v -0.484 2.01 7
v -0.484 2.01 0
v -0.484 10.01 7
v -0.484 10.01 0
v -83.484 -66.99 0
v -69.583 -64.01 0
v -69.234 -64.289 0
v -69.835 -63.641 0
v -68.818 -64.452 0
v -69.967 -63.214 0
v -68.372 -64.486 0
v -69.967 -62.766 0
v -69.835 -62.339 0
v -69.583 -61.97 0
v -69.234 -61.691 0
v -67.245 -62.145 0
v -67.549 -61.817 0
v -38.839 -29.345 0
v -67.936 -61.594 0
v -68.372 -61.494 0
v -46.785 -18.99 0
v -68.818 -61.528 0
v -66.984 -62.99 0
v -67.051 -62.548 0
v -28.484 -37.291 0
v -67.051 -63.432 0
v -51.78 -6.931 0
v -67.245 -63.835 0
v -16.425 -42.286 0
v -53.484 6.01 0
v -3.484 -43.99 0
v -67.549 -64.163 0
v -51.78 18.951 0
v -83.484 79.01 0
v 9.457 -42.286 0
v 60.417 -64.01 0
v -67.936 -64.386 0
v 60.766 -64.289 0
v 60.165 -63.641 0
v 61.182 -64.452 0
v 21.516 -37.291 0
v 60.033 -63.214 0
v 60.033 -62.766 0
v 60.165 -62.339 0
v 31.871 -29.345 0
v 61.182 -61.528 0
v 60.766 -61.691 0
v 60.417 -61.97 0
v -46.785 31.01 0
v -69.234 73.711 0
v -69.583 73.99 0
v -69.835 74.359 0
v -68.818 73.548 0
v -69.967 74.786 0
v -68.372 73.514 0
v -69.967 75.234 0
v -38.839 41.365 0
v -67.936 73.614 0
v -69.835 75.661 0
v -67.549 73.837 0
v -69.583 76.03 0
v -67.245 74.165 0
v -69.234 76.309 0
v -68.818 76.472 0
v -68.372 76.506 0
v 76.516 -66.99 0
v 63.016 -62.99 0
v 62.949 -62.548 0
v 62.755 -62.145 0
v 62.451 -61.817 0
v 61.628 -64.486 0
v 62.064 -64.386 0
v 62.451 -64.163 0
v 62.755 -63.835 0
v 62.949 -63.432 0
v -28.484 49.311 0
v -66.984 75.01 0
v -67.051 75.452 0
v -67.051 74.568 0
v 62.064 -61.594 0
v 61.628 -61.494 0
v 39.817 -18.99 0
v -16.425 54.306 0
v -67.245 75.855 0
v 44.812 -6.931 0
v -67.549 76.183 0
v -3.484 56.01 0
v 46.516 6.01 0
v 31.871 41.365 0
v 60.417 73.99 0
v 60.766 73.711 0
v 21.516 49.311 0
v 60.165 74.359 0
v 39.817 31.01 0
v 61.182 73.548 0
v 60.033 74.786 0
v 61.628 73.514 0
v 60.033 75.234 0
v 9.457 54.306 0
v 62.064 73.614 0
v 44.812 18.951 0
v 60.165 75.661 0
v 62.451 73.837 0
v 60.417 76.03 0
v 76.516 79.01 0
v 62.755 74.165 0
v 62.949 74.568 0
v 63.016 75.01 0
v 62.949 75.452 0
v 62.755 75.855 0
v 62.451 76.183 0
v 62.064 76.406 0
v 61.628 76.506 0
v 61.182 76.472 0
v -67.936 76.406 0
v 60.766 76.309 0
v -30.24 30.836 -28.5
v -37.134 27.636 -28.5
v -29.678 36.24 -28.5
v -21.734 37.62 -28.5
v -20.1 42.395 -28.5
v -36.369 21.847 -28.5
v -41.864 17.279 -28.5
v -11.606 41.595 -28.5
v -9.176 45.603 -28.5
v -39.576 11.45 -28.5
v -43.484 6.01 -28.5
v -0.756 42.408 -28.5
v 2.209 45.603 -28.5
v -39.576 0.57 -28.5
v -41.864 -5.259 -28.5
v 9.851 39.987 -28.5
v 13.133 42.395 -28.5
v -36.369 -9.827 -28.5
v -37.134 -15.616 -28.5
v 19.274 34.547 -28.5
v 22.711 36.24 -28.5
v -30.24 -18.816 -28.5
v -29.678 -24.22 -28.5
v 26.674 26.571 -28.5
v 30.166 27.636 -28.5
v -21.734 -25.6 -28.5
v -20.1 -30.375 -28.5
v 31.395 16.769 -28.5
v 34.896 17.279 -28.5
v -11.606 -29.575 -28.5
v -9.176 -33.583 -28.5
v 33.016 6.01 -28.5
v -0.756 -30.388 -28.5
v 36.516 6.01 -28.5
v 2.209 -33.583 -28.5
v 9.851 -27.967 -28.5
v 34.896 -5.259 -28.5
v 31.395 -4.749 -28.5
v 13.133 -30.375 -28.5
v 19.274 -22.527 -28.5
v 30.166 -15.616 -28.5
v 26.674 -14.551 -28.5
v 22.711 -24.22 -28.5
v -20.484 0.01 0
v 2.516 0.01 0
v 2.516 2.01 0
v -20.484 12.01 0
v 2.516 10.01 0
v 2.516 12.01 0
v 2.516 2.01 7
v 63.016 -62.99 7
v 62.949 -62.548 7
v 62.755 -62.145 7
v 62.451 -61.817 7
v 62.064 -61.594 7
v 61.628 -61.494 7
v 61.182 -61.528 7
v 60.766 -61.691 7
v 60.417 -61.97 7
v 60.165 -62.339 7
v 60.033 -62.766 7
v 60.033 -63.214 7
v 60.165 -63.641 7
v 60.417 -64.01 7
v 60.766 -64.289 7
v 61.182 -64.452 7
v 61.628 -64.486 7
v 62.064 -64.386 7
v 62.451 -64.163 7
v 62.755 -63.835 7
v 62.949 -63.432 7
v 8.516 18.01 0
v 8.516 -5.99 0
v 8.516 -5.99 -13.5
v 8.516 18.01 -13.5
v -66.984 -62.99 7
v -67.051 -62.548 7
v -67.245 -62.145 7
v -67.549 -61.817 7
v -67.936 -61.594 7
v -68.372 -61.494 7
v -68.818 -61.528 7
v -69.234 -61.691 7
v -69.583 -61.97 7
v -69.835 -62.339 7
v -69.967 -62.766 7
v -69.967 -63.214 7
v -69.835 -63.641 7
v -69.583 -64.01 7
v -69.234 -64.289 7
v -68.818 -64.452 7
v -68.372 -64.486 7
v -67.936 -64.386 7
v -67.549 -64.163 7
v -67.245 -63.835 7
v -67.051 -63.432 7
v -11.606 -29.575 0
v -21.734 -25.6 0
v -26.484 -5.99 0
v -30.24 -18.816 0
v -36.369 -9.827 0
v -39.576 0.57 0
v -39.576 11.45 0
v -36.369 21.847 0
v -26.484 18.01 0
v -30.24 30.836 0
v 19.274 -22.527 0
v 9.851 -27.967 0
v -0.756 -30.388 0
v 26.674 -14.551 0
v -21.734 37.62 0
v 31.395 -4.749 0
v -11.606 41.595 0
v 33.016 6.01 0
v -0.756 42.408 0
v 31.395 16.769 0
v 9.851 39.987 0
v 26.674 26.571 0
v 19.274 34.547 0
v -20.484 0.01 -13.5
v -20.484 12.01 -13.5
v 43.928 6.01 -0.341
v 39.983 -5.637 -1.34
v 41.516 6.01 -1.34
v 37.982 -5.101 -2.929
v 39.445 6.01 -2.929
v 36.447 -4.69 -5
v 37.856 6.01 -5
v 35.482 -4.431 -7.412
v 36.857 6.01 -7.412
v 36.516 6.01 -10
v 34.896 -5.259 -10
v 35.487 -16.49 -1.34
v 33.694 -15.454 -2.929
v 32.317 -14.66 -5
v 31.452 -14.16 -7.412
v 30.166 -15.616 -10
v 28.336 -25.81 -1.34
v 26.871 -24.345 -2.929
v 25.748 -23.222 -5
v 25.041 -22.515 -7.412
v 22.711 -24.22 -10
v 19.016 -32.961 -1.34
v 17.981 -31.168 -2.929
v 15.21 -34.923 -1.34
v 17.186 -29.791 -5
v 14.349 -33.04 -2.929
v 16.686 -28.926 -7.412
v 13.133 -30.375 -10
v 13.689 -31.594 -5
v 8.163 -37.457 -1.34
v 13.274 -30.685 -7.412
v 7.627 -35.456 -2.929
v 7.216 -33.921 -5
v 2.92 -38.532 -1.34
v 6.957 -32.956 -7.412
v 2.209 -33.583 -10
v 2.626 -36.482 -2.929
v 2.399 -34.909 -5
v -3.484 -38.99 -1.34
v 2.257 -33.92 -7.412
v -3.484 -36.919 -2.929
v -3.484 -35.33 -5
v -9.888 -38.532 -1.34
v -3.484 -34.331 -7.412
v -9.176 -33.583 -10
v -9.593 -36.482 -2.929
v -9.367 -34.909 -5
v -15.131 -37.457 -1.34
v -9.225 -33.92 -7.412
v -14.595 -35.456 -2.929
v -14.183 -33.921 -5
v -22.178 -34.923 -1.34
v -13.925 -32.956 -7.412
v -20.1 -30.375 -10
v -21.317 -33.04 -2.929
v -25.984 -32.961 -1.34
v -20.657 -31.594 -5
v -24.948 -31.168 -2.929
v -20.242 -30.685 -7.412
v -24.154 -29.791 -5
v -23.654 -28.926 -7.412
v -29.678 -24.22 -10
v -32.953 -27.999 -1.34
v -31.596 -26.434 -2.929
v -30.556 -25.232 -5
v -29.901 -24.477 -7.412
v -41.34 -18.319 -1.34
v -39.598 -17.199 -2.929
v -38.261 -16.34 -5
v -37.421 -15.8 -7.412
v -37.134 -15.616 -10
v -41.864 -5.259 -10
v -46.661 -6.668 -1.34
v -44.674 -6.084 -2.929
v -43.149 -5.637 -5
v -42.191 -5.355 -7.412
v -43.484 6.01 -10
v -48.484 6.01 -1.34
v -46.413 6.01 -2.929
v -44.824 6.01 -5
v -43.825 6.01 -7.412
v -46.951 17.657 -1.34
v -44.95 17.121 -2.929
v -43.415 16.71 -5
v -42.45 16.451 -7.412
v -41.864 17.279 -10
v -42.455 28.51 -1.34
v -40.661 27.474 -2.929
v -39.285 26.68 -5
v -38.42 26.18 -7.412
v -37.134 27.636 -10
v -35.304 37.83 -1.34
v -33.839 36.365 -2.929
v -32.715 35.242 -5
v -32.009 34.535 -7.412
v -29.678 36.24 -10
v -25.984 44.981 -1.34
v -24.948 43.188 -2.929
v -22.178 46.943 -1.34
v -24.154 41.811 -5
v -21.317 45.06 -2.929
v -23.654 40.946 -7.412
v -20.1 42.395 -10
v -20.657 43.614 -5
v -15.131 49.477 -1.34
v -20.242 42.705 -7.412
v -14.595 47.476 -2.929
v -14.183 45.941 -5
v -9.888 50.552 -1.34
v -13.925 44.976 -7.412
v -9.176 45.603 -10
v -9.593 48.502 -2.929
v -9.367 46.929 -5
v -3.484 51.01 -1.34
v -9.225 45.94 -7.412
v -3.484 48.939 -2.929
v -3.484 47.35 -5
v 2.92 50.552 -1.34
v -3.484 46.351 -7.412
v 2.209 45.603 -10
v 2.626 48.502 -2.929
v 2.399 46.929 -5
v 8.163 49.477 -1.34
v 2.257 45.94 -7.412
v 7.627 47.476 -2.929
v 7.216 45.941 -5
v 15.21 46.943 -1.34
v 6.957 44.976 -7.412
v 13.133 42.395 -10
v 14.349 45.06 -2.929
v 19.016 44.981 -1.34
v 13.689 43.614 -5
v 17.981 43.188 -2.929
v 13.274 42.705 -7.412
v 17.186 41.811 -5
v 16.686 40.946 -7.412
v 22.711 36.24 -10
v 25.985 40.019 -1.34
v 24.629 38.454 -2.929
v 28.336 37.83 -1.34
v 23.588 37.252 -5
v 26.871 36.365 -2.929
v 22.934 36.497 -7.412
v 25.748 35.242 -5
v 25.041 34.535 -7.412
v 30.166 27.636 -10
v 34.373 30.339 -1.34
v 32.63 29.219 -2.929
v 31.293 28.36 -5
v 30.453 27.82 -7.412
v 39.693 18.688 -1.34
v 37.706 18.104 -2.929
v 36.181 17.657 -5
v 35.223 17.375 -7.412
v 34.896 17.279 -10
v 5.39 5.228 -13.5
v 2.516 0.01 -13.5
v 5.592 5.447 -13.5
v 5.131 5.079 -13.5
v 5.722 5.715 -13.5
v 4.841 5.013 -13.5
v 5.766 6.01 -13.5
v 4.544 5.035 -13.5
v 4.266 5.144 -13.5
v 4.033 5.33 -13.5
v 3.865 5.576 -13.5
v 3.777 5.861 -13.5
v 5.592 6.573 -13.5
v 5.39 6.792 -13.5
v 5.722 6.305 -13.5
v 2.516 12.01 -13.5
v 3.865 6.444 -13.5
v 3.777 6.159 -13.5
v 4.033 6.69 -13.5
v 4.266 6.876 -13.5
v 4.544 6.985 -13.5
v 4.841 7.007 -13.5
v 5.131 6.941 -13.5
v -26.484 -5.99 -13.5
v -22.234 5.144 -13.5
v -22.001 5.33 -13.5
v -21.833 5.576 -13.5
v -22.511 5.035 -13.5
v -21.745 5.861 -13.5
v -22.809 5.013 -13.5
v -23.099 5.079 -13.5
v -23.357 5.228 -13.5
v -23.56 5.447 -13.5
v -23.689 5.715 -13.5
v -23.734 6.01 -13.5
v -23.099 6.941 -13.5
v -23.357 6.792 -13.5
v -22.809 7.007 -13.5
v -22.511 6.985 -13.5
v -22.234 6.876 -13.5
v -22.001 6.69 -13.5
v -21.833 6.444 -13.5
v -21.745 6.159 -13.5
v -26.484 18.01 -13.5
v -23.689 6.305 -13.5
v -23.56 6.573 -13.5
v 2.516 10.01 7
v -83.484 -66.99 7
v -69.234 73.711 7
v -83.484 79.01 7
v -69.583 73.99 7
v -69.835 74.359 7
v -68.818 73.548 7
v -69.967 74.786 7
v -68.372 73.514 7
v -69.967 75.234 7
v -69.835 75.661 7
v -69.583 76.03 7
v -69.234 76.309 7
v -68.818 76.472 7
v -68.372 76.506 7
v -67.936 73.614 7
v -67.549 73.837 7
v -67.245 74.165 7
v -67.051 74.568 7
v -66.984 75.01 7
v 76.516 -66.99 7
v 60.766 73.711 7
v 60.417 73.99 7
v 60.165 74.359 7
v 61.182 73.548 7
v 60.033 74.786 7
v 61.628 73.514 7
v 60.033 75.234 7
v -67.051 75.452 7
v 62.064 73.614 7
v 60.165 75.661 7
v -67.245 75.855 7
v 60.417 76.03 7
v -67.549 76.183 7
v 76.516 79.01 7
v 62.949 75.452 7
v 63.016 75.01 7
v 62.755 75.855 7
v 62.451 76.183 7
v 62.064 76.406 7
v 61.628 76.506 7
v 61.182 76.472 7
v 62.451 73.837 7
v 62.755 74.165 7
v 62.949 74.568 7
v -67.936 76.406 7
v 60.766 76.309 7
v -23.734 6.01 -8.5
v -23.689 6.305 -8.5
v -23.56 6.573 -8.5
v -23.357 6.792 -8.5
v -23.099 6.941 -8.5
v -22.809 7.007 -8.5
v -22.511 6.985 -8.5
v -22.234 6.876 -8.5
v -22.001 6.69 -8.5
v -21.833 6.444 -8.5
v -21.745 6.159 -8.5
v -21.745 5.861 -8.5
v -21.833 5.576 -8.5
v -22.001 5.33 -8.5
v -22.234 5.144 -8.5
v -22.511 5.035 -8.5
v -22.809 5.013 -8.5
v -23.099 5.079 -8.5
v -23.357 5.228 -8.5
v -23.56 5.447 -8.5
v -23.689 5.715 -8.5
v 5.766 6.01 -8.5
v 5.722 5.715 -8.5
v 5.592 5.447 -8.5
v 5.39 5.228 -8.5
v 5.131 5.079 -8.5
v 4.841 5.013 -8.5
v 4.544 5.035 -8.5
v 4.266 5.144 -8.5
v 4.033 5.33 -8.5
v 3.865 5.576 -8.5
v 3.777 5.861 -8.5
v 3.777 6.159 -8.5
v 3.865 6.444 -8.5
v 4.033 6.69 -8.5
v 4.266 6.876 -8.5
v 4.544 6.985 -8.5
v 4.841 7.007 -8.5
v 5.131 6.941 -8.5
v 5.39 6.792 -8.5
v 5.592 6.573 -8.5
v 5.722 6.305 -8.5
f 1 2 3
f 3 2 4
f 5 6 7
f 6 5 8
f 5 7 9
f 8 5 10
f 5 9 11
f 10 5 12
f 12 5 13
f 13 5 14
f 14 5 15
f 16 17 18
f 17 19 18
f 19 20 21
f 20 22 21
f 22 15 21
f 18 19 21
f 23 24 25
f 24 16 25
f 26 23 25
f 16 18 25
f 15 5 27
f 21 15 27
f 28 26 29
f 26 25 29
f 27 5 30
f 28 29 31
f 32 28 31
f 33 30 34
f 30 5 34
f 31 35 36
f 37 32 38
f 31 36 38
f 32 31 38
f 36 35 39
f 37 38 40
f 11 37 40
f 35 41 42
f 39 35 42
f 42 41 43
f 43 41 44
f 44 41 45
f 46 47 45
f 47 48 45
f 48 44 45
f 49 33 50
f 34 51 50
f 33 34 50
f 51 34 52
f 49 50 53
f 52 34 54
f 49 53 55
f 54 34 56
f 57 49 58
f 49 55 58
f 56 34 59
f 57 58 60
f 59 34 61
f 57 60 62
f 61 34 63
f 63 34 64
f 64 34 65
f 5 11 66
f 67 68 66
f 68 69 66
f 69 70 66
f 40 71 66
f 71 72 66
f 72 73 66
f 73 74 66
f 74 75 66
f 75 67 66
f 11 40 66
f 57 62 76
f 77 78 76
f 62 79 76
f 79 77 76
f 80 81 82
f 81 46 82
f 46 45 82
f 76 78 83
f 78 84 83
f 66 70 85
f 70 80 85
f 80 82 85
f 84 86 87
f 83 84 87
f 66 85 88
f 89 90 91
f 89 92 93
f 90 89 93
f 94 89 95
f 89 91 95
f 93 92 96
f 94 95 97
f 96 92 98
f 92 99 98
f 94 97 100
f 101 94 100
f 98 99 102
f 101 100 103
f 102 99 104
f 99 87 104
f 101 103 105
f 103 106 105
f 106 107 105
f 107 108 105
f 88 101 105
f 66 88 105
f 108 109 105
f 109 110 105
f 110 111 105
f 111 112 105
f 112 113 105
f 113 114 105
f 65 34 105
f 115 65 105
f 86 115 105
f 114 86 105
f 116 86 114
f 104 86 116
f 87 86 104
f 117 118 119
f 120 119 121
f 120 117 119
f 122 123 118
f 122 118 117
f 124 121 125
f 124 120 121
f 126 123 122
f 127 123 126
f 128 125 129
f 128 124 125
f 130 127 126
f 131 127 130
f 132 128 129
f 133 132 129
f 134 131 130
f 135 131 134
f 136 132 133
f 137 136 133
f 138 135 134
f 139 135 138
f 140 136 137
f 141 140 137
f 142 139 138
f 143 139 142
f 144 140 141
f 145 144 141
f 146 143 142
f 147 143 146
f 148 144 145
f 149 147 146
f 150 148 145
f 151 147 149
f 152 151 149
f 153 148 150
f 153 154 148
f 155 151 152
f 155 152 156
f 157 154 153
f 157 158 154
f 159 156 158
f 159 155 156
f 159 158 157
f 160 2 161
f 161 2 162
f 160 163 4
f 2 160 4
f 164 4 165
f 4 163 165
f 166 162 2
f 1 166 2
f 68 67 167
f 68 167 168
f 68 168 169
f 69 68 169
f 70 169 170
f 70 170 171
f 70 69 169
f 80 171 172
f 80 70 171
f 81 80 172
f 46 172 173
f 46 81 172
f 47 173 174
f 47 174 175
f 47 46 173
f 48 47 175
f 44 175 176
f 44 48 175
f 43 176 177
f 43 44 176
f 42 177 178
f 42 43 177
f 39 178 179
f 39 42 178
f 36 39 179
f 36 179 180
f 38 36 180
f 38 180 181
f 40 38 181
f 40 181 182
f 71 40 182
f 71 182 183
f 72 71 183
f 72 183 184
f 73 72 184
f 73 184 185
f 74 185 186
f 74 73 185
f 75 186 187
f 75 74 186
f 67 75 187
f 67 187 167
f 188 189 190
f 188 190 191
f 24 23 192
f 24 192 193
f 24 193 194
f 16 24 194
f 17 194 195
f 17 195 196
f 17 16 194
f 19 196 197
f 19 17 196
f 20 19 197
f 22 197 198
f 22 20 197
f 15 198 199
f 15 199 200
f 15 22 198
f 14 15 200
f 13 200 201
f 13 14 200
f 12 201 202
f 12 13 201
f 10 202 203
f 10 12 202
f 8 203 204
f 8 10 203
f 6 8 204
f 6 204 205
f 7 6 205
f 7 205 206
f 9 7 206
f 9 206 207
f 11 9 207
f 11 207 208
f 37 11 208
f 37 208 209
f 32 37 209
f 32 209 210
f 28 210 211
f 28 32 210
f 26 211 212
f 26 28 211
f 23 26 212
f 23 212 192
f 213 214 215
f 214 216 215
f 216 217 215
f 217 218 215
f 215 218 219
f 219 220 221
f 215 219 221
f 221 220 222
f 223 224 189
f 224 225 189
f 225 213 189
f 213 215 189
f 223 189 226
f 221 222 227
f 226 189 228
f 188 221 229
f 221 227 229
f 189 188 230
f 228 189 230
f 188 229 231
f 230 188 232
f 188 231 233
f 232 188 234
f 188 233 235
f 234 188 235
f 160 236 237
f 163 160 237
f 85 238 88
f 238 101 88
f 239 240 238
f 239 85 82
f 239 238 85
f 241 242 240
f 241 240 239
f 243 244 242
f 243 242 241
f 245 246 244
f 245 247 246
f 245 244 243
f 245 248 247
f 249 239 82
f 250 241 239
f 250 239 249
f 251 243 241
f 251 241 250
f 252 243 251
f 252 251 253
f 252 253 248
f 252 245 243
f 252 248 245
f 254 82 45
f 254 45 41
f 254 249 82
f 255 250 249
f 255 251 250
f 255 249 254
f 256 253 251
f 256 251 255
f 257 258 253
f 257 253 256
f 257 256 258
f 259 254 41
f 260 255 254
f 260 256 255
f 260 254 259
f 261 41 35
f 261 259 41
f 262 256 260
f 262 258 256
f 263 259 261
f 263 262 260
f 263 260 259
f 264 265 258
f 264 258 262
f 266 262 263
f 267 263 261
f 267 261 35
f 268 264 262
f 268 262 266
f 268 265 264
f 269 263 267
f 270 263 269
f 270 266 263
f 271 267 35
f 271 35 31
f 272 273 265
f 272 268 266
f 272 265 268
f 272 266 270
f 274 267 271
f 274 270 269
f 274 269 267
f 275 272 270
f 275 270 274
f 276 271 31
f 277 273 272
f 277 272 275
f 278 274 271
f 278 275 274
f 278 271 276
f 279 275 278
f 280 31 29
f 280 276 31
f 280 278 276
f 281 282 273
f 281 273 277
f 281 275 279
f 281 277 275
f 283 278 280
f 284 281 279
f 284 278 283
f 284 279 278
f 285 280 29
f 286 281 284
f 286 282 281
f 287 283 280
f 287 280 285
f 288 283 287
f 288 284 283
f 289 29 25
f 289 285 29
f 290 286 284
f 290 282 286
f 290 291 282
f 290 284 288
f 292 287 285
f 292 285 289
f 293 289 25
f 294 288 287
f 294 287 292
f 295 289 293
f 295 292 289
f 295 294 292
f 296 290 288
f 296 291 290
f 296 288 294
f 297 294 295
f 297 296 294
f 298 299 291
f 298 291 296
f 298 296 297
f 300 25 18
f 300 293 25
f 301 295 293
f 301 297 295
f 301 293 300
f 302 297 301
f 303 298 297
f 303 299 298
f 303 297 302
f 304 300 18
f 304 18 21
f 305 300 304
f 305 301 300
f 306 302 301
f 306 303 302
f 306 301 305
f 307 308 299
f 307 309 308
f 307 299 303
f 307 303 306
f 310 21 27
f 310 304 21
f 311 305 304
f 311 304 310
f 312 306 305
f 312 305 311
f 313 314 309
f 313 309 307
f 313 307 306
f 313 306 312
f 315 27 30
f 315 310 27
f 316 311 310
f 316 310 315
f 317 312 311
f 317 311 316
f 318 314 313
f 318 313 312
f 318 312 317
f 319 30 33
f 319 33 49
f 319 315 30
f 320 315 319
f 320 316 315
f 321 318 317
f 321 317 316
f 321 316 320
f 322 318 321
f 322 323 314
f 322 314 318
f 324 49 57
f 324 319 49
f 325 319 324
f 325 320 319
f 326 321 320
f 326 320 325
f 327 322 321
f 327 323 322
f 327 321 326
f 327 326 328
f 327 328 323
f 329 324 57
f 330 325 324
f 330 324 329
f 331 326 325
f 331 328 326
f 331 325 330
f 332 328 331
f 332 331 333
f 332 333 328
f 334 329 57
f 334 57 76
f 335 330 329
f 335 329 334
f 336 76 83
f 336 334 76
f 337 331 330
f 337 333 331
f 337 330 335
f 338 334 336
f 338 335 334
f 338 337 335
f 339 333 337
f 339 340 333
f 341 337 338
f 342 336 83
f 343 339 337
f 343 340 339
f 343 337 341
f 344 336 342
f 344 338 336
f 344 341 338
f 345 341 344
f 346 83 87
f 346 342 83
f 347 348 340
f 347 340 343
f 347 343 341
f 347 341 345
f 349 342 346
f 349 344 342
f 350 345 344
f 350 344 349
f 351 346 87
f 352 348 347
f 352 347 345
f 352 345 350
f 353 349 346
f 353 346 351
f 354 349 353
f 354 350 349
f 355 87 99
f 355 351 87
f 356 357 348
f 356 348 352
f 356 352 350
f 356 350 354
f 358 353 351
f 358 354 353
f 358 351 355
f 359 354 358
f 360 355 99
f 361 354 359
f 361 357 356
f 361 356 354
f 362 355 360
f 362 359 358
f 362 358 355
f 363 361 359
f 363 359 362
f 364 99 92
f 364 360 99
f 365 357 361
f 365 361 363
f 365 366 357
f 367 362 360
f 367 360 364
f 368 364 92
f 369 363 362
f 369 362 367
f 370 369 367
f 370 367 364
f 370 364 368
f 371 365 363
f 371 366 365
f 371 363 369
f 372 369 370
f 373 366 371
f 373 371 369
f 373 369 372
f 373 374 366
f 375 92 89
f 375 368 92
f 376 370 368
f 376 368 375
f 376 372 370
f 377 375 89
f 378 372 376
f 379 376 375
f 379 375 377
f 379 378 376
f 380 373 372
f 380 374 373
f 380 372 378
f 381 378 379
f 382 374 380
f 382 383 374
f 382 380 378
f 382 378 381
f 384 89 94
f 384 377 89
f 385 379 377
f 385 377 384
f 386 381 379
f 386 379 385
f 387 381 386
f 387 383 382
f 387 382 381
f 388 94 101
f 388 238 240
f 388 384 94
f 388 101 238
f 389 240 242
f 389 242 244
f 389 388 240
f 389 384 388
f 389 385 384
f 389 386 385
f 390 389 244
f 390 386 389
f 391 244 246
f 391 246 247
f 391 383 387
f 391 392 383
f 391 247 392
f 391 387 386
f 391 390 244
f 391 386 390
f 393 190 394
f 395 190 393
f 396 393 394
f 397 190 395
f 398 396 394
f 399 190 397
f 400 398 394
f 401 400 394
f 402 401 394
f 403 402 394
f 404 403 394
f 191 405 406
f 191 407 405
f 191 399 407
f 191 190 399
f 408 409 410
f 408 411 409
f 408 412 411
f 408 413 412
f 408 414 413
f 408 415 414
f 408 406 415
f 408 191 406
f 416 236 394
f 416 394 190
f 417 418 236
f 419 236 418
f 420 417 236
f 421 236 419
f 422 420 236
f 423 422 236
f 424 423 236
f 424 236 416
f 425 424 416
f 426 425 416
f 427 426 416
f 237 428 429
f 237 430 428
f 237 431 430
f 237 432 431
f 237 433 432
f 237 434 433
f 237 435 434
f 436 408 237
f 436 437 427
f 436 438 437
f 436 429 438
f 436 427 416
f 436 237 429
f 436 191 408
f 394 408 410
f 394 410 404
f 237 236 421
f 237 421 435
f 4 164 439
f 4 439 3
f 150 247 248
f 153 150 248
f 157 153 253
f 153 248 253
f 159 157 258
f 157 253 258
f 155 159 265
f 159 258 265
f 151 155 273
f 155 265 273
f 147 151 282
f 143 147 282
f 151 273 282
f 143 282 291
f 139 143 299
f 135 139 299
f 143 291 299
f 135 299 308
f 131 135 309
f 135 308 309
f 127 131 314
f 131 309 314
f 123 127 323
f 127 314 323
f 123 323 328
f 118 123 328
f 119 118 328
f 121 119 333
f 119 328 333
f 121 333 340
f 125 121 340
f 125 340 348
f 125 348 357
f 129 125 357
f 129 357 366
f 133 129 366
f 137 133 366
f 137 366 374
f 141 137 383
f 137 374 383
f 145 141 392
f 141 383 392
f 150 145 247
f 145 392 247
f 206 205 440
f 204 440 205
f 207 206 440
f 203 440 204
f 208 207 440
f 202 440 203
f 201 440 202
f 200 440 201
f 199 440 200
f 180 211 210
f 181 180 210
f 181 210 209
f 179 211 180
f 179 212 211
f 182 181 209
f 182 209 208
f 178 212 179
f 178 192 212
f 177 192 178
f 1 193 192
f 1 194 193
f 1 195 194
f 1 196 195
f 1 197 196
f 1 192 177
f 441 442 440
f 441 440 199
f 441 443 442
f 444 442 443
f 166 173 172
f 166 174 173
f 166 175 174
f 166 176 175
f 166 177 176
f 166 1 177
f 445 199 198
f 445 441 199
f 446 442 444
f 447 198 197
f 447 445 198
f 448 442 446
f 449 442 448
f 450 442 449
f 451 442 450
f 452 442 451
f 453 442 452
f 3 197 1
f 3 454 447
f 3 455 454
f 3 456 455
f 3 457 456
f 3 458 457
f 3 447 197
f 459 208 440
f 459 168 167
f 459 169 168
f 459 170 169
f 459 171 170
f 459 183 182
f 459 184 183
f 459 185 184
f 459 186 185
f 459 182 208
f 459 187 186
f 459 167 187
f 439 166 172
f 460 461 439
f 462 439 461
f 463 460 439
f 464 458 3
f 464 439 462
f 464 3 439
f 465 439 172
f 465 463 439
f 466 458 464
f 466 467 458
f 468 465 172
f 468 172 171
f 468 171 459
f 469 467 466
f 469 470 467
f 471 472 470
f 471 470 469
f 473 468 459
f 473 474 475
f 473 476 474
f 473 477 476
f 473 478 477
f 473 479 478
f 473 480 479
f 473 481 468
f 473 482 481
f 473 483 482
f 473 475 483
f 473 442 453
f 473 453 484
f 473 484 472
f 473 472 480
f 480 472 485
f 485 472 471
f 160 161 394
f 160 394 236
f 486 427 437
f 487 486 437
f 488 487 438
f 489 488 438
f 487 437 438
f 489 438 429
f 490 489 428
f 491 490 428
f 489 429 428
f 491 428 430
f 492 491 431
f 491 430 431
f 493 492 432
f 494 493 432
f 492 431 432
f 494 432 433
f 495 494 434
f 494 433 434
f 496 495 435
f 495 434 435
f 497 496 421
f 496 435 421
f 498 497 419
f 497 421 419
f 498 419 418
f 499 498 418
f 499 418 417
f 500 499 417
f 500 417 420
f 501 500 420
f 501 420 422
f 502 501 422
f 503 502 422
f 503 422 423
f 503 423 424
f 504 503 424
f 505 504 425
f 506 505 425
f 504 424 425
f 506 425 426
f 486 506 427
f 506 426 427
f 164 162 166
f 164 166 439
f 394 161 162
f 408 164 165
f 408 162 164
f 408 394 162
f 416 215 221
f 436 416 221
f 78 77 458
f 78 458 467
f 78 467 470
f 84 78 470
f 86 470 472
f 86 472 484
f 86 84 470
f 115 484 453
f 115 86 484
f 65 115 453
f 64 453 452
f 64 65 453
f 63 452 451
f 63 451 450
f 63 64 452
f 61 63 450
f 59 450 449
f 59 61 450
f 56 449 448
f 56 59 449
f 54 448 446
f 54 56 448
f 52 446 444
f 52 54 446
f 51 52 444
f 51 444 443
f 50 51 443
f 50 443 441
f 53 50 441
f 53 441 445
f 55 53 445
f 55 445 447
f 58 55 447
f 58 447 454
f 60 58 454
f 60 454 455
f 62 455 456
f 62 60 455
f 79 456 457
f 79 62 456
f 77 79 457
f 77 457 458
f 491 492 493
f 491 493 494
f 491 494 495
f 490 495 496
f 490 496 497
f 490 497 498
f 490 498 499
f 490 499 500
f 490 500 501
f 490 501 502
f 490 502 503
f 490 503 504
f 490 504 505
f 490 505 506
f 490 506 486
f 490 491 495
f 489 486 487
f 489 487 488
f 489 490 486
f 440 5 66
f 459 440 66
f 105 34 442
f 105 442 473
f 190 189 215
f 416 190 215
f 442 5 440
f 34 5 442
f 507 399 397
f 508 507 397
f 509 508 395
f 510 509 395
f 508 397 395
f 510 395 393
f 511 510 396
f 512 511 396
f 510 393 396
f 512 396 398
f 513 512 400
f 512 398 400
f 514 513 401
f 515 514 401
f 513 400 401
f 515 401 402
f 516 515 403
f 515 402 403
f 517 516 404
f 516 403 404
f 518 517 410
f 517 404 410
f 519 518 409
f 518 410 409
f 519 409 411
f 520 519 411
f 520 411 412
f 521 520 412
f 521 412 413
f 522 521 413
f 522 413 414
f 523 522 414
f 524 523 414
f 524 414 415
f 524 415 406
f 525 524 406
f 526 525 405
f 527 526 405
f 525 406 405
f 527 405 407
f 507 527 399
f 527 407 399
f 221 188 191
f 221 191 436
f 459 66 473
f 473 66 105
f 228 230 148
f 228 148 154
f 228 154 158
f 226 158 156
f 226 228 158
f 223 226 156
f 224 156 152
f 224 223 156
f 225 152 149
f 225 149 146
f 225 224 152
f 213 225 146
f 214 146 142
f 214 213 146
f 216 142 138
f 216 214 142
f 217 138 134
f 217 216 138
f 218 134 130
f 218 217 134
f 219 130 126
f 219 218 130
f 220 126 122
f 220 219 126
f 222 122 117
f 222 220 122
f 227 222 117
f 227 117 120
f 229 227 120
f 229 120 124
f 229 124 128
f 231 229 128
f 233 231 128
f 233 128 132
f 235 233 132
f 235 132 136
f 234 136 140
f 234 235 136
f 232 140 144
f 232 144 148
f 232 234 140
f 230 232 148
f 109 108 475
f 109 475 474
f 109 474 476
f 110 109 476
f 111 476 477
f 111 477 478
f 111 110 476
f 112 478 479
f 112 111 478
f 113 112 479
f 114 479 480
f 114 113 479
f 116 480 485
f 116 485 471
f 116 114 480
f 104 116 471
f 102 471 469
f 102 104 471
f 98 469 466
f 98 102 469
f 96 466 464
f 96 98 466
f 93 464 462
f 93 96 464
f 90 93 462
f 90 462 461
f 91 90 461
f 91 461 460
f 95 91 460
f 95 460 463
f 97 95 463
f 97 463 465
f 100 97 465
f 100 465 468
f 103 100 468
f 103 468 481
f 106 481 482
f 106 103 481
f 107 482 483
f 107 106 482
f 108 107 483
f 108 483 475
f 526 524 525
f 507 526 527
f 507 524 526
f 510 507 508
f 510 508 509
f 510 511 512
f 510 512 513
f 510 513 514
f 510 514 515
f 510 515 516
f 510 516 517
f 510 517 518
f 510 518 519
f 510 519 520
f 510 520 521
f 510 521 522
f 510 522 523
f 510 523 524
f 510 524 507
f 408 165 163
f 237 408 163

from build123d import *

# Parameters (mm, degrees)
SCHIZZO1_W                   = 160
SCHIZZO1_H                   = 146
SCHIZZO1_R                   = 1.5
ESTRUSIONE_ESTRUSIONE1_DEPTH = 7
SCHIZZO2_W                   = 35
SCHIZZO2_H                   = 24
SCHIZZO2_W_2                 = 23
SCHIZZO2_H_2                 = 12
ESTRUSIONE_ESTRUSIONE2_DEPTH = 13.5
SCHIZZO3_R                   = 1
TAGLIO_ESTRUSIONE1_DEPTH     = 5
SCHIZZO4_R                   = 40
SCHIZZO4_R_2                 = 36.5
ESTRUSIONE_ESTRUSIONE3_DEPTH = 28.5
RACCORDO1_R                  = 10
SCHIZZO5_W                   = 3
SCHIZZO5_H                   = 8
TAGLIO_ESTRUSIONE2_DEPTH     = 41


with BuildPart() as part:
    # Schizzo1 → Estrusione-Estrusione1 (new body)
    with BuildSketch(Plane.XY):
        with Locations((-3.483874863, 6.01)):
            Rectangle(SCHIZZO1_W, SCHIZZO1_H)
        with Locations((-68.483874863, 75.01)):
            Circle(SCHIZZO1_R, mode=Mode.SUBTRACT)
        with Locations((61.516125137, 75.01)):
            Circle(SCHIZZO1_R, mode=Mode.SUBTRACT)
        with Locations((-68.483874863, -62.99)):
            Circle(SCHIZZO1_R, mode=Mode.SUBTRACT)
        with Locations((61.516125137, -62.99)):
            Circle(SCHIZZO1_R, mode=Mode.SUBTRACT)
    extrude(amount=ESTRUSIONE_ESTRUSIONE1_DEPTH)

    # Schizzo2 → Estrusione-Estrusione2 (add)
    with BuildSketch(Plane(origin=(0, 0, 0), x_dir=(-1, 0, 0), z_dir=(0, 0, -1))):
        with Locations((8.983874863, 6.01)):
            Rectangle(SCHIZZO2_W, SCHIZZO2_H)
        with Locations((8.983874863, 6.01)):
            Rectangle(SCHIZZO2_W_2, SCHIZZO2_H_2, mode=Mode.SUBTRACT)
    extrude(amount=ESTRUSIONE_ESTRUSIONE2_DEPTH)

    # Schizzo3 → Taglio-Estrusione1 (cut)
    with BuildSketch(Plane(origin=(0, 0, -13.5), x_dir=(-1, 0, 0), z_dir=(0, 0, -1))):
        with Locations((22.733874863, 6.01)):
            Circle(SCHIZZO3_R)
        with Locations((-4.766125137, 6.01)):
            Circle(SCHIZZO3_R)
    extrude(amount=-TAGLIO_ESTRUSIONE1_DEPTH, mode=Mode.SUBTRACT)

    # Schizzo4 → Estrusione-Estrusione3 (add)
    with BuildSketch(Plane(origin=(0, 0, 0), x_dir=(-1, 0, 0), z_dir=(0, 0, -1))):
        with Locations((3.483874863, 6.01)):
            Circle(SCHIZZO4_R)
        with Locations((3.483874863, 6.01)):
            Circle(SCHIZZO4_R_2, mode=Mode.SUBTRACT)
    extrude(amount=ESTRUSIONE_ESTRUSIONE3_DEPTH)

    # Raccordo1
    raccordo1_edges = [part.edges().sort_by_distance(p)[0] for p in [
        (36.516125137, 6.01, 0),
    ]]
    fillet(raccordo1_edges, radius=RACCORDO1_R)

    # Schizzo5 → Taglio-Estrusione2 (cut)
    with BuildSketch(Plane(origin=(0, 0, 0), x_dir=(-1, 0, 0), z_dir=(0, 0, -1))):
        with Locations((-1.016125137, 6.01)):
            Rectangle(SCHIZZO5_W, SCHIZZO5_H)
    extrude(amount=-TAGLIO_ESTRUSIONE2_DEPTH, mode=Mode.SUBTRACT)


solid = part.part
